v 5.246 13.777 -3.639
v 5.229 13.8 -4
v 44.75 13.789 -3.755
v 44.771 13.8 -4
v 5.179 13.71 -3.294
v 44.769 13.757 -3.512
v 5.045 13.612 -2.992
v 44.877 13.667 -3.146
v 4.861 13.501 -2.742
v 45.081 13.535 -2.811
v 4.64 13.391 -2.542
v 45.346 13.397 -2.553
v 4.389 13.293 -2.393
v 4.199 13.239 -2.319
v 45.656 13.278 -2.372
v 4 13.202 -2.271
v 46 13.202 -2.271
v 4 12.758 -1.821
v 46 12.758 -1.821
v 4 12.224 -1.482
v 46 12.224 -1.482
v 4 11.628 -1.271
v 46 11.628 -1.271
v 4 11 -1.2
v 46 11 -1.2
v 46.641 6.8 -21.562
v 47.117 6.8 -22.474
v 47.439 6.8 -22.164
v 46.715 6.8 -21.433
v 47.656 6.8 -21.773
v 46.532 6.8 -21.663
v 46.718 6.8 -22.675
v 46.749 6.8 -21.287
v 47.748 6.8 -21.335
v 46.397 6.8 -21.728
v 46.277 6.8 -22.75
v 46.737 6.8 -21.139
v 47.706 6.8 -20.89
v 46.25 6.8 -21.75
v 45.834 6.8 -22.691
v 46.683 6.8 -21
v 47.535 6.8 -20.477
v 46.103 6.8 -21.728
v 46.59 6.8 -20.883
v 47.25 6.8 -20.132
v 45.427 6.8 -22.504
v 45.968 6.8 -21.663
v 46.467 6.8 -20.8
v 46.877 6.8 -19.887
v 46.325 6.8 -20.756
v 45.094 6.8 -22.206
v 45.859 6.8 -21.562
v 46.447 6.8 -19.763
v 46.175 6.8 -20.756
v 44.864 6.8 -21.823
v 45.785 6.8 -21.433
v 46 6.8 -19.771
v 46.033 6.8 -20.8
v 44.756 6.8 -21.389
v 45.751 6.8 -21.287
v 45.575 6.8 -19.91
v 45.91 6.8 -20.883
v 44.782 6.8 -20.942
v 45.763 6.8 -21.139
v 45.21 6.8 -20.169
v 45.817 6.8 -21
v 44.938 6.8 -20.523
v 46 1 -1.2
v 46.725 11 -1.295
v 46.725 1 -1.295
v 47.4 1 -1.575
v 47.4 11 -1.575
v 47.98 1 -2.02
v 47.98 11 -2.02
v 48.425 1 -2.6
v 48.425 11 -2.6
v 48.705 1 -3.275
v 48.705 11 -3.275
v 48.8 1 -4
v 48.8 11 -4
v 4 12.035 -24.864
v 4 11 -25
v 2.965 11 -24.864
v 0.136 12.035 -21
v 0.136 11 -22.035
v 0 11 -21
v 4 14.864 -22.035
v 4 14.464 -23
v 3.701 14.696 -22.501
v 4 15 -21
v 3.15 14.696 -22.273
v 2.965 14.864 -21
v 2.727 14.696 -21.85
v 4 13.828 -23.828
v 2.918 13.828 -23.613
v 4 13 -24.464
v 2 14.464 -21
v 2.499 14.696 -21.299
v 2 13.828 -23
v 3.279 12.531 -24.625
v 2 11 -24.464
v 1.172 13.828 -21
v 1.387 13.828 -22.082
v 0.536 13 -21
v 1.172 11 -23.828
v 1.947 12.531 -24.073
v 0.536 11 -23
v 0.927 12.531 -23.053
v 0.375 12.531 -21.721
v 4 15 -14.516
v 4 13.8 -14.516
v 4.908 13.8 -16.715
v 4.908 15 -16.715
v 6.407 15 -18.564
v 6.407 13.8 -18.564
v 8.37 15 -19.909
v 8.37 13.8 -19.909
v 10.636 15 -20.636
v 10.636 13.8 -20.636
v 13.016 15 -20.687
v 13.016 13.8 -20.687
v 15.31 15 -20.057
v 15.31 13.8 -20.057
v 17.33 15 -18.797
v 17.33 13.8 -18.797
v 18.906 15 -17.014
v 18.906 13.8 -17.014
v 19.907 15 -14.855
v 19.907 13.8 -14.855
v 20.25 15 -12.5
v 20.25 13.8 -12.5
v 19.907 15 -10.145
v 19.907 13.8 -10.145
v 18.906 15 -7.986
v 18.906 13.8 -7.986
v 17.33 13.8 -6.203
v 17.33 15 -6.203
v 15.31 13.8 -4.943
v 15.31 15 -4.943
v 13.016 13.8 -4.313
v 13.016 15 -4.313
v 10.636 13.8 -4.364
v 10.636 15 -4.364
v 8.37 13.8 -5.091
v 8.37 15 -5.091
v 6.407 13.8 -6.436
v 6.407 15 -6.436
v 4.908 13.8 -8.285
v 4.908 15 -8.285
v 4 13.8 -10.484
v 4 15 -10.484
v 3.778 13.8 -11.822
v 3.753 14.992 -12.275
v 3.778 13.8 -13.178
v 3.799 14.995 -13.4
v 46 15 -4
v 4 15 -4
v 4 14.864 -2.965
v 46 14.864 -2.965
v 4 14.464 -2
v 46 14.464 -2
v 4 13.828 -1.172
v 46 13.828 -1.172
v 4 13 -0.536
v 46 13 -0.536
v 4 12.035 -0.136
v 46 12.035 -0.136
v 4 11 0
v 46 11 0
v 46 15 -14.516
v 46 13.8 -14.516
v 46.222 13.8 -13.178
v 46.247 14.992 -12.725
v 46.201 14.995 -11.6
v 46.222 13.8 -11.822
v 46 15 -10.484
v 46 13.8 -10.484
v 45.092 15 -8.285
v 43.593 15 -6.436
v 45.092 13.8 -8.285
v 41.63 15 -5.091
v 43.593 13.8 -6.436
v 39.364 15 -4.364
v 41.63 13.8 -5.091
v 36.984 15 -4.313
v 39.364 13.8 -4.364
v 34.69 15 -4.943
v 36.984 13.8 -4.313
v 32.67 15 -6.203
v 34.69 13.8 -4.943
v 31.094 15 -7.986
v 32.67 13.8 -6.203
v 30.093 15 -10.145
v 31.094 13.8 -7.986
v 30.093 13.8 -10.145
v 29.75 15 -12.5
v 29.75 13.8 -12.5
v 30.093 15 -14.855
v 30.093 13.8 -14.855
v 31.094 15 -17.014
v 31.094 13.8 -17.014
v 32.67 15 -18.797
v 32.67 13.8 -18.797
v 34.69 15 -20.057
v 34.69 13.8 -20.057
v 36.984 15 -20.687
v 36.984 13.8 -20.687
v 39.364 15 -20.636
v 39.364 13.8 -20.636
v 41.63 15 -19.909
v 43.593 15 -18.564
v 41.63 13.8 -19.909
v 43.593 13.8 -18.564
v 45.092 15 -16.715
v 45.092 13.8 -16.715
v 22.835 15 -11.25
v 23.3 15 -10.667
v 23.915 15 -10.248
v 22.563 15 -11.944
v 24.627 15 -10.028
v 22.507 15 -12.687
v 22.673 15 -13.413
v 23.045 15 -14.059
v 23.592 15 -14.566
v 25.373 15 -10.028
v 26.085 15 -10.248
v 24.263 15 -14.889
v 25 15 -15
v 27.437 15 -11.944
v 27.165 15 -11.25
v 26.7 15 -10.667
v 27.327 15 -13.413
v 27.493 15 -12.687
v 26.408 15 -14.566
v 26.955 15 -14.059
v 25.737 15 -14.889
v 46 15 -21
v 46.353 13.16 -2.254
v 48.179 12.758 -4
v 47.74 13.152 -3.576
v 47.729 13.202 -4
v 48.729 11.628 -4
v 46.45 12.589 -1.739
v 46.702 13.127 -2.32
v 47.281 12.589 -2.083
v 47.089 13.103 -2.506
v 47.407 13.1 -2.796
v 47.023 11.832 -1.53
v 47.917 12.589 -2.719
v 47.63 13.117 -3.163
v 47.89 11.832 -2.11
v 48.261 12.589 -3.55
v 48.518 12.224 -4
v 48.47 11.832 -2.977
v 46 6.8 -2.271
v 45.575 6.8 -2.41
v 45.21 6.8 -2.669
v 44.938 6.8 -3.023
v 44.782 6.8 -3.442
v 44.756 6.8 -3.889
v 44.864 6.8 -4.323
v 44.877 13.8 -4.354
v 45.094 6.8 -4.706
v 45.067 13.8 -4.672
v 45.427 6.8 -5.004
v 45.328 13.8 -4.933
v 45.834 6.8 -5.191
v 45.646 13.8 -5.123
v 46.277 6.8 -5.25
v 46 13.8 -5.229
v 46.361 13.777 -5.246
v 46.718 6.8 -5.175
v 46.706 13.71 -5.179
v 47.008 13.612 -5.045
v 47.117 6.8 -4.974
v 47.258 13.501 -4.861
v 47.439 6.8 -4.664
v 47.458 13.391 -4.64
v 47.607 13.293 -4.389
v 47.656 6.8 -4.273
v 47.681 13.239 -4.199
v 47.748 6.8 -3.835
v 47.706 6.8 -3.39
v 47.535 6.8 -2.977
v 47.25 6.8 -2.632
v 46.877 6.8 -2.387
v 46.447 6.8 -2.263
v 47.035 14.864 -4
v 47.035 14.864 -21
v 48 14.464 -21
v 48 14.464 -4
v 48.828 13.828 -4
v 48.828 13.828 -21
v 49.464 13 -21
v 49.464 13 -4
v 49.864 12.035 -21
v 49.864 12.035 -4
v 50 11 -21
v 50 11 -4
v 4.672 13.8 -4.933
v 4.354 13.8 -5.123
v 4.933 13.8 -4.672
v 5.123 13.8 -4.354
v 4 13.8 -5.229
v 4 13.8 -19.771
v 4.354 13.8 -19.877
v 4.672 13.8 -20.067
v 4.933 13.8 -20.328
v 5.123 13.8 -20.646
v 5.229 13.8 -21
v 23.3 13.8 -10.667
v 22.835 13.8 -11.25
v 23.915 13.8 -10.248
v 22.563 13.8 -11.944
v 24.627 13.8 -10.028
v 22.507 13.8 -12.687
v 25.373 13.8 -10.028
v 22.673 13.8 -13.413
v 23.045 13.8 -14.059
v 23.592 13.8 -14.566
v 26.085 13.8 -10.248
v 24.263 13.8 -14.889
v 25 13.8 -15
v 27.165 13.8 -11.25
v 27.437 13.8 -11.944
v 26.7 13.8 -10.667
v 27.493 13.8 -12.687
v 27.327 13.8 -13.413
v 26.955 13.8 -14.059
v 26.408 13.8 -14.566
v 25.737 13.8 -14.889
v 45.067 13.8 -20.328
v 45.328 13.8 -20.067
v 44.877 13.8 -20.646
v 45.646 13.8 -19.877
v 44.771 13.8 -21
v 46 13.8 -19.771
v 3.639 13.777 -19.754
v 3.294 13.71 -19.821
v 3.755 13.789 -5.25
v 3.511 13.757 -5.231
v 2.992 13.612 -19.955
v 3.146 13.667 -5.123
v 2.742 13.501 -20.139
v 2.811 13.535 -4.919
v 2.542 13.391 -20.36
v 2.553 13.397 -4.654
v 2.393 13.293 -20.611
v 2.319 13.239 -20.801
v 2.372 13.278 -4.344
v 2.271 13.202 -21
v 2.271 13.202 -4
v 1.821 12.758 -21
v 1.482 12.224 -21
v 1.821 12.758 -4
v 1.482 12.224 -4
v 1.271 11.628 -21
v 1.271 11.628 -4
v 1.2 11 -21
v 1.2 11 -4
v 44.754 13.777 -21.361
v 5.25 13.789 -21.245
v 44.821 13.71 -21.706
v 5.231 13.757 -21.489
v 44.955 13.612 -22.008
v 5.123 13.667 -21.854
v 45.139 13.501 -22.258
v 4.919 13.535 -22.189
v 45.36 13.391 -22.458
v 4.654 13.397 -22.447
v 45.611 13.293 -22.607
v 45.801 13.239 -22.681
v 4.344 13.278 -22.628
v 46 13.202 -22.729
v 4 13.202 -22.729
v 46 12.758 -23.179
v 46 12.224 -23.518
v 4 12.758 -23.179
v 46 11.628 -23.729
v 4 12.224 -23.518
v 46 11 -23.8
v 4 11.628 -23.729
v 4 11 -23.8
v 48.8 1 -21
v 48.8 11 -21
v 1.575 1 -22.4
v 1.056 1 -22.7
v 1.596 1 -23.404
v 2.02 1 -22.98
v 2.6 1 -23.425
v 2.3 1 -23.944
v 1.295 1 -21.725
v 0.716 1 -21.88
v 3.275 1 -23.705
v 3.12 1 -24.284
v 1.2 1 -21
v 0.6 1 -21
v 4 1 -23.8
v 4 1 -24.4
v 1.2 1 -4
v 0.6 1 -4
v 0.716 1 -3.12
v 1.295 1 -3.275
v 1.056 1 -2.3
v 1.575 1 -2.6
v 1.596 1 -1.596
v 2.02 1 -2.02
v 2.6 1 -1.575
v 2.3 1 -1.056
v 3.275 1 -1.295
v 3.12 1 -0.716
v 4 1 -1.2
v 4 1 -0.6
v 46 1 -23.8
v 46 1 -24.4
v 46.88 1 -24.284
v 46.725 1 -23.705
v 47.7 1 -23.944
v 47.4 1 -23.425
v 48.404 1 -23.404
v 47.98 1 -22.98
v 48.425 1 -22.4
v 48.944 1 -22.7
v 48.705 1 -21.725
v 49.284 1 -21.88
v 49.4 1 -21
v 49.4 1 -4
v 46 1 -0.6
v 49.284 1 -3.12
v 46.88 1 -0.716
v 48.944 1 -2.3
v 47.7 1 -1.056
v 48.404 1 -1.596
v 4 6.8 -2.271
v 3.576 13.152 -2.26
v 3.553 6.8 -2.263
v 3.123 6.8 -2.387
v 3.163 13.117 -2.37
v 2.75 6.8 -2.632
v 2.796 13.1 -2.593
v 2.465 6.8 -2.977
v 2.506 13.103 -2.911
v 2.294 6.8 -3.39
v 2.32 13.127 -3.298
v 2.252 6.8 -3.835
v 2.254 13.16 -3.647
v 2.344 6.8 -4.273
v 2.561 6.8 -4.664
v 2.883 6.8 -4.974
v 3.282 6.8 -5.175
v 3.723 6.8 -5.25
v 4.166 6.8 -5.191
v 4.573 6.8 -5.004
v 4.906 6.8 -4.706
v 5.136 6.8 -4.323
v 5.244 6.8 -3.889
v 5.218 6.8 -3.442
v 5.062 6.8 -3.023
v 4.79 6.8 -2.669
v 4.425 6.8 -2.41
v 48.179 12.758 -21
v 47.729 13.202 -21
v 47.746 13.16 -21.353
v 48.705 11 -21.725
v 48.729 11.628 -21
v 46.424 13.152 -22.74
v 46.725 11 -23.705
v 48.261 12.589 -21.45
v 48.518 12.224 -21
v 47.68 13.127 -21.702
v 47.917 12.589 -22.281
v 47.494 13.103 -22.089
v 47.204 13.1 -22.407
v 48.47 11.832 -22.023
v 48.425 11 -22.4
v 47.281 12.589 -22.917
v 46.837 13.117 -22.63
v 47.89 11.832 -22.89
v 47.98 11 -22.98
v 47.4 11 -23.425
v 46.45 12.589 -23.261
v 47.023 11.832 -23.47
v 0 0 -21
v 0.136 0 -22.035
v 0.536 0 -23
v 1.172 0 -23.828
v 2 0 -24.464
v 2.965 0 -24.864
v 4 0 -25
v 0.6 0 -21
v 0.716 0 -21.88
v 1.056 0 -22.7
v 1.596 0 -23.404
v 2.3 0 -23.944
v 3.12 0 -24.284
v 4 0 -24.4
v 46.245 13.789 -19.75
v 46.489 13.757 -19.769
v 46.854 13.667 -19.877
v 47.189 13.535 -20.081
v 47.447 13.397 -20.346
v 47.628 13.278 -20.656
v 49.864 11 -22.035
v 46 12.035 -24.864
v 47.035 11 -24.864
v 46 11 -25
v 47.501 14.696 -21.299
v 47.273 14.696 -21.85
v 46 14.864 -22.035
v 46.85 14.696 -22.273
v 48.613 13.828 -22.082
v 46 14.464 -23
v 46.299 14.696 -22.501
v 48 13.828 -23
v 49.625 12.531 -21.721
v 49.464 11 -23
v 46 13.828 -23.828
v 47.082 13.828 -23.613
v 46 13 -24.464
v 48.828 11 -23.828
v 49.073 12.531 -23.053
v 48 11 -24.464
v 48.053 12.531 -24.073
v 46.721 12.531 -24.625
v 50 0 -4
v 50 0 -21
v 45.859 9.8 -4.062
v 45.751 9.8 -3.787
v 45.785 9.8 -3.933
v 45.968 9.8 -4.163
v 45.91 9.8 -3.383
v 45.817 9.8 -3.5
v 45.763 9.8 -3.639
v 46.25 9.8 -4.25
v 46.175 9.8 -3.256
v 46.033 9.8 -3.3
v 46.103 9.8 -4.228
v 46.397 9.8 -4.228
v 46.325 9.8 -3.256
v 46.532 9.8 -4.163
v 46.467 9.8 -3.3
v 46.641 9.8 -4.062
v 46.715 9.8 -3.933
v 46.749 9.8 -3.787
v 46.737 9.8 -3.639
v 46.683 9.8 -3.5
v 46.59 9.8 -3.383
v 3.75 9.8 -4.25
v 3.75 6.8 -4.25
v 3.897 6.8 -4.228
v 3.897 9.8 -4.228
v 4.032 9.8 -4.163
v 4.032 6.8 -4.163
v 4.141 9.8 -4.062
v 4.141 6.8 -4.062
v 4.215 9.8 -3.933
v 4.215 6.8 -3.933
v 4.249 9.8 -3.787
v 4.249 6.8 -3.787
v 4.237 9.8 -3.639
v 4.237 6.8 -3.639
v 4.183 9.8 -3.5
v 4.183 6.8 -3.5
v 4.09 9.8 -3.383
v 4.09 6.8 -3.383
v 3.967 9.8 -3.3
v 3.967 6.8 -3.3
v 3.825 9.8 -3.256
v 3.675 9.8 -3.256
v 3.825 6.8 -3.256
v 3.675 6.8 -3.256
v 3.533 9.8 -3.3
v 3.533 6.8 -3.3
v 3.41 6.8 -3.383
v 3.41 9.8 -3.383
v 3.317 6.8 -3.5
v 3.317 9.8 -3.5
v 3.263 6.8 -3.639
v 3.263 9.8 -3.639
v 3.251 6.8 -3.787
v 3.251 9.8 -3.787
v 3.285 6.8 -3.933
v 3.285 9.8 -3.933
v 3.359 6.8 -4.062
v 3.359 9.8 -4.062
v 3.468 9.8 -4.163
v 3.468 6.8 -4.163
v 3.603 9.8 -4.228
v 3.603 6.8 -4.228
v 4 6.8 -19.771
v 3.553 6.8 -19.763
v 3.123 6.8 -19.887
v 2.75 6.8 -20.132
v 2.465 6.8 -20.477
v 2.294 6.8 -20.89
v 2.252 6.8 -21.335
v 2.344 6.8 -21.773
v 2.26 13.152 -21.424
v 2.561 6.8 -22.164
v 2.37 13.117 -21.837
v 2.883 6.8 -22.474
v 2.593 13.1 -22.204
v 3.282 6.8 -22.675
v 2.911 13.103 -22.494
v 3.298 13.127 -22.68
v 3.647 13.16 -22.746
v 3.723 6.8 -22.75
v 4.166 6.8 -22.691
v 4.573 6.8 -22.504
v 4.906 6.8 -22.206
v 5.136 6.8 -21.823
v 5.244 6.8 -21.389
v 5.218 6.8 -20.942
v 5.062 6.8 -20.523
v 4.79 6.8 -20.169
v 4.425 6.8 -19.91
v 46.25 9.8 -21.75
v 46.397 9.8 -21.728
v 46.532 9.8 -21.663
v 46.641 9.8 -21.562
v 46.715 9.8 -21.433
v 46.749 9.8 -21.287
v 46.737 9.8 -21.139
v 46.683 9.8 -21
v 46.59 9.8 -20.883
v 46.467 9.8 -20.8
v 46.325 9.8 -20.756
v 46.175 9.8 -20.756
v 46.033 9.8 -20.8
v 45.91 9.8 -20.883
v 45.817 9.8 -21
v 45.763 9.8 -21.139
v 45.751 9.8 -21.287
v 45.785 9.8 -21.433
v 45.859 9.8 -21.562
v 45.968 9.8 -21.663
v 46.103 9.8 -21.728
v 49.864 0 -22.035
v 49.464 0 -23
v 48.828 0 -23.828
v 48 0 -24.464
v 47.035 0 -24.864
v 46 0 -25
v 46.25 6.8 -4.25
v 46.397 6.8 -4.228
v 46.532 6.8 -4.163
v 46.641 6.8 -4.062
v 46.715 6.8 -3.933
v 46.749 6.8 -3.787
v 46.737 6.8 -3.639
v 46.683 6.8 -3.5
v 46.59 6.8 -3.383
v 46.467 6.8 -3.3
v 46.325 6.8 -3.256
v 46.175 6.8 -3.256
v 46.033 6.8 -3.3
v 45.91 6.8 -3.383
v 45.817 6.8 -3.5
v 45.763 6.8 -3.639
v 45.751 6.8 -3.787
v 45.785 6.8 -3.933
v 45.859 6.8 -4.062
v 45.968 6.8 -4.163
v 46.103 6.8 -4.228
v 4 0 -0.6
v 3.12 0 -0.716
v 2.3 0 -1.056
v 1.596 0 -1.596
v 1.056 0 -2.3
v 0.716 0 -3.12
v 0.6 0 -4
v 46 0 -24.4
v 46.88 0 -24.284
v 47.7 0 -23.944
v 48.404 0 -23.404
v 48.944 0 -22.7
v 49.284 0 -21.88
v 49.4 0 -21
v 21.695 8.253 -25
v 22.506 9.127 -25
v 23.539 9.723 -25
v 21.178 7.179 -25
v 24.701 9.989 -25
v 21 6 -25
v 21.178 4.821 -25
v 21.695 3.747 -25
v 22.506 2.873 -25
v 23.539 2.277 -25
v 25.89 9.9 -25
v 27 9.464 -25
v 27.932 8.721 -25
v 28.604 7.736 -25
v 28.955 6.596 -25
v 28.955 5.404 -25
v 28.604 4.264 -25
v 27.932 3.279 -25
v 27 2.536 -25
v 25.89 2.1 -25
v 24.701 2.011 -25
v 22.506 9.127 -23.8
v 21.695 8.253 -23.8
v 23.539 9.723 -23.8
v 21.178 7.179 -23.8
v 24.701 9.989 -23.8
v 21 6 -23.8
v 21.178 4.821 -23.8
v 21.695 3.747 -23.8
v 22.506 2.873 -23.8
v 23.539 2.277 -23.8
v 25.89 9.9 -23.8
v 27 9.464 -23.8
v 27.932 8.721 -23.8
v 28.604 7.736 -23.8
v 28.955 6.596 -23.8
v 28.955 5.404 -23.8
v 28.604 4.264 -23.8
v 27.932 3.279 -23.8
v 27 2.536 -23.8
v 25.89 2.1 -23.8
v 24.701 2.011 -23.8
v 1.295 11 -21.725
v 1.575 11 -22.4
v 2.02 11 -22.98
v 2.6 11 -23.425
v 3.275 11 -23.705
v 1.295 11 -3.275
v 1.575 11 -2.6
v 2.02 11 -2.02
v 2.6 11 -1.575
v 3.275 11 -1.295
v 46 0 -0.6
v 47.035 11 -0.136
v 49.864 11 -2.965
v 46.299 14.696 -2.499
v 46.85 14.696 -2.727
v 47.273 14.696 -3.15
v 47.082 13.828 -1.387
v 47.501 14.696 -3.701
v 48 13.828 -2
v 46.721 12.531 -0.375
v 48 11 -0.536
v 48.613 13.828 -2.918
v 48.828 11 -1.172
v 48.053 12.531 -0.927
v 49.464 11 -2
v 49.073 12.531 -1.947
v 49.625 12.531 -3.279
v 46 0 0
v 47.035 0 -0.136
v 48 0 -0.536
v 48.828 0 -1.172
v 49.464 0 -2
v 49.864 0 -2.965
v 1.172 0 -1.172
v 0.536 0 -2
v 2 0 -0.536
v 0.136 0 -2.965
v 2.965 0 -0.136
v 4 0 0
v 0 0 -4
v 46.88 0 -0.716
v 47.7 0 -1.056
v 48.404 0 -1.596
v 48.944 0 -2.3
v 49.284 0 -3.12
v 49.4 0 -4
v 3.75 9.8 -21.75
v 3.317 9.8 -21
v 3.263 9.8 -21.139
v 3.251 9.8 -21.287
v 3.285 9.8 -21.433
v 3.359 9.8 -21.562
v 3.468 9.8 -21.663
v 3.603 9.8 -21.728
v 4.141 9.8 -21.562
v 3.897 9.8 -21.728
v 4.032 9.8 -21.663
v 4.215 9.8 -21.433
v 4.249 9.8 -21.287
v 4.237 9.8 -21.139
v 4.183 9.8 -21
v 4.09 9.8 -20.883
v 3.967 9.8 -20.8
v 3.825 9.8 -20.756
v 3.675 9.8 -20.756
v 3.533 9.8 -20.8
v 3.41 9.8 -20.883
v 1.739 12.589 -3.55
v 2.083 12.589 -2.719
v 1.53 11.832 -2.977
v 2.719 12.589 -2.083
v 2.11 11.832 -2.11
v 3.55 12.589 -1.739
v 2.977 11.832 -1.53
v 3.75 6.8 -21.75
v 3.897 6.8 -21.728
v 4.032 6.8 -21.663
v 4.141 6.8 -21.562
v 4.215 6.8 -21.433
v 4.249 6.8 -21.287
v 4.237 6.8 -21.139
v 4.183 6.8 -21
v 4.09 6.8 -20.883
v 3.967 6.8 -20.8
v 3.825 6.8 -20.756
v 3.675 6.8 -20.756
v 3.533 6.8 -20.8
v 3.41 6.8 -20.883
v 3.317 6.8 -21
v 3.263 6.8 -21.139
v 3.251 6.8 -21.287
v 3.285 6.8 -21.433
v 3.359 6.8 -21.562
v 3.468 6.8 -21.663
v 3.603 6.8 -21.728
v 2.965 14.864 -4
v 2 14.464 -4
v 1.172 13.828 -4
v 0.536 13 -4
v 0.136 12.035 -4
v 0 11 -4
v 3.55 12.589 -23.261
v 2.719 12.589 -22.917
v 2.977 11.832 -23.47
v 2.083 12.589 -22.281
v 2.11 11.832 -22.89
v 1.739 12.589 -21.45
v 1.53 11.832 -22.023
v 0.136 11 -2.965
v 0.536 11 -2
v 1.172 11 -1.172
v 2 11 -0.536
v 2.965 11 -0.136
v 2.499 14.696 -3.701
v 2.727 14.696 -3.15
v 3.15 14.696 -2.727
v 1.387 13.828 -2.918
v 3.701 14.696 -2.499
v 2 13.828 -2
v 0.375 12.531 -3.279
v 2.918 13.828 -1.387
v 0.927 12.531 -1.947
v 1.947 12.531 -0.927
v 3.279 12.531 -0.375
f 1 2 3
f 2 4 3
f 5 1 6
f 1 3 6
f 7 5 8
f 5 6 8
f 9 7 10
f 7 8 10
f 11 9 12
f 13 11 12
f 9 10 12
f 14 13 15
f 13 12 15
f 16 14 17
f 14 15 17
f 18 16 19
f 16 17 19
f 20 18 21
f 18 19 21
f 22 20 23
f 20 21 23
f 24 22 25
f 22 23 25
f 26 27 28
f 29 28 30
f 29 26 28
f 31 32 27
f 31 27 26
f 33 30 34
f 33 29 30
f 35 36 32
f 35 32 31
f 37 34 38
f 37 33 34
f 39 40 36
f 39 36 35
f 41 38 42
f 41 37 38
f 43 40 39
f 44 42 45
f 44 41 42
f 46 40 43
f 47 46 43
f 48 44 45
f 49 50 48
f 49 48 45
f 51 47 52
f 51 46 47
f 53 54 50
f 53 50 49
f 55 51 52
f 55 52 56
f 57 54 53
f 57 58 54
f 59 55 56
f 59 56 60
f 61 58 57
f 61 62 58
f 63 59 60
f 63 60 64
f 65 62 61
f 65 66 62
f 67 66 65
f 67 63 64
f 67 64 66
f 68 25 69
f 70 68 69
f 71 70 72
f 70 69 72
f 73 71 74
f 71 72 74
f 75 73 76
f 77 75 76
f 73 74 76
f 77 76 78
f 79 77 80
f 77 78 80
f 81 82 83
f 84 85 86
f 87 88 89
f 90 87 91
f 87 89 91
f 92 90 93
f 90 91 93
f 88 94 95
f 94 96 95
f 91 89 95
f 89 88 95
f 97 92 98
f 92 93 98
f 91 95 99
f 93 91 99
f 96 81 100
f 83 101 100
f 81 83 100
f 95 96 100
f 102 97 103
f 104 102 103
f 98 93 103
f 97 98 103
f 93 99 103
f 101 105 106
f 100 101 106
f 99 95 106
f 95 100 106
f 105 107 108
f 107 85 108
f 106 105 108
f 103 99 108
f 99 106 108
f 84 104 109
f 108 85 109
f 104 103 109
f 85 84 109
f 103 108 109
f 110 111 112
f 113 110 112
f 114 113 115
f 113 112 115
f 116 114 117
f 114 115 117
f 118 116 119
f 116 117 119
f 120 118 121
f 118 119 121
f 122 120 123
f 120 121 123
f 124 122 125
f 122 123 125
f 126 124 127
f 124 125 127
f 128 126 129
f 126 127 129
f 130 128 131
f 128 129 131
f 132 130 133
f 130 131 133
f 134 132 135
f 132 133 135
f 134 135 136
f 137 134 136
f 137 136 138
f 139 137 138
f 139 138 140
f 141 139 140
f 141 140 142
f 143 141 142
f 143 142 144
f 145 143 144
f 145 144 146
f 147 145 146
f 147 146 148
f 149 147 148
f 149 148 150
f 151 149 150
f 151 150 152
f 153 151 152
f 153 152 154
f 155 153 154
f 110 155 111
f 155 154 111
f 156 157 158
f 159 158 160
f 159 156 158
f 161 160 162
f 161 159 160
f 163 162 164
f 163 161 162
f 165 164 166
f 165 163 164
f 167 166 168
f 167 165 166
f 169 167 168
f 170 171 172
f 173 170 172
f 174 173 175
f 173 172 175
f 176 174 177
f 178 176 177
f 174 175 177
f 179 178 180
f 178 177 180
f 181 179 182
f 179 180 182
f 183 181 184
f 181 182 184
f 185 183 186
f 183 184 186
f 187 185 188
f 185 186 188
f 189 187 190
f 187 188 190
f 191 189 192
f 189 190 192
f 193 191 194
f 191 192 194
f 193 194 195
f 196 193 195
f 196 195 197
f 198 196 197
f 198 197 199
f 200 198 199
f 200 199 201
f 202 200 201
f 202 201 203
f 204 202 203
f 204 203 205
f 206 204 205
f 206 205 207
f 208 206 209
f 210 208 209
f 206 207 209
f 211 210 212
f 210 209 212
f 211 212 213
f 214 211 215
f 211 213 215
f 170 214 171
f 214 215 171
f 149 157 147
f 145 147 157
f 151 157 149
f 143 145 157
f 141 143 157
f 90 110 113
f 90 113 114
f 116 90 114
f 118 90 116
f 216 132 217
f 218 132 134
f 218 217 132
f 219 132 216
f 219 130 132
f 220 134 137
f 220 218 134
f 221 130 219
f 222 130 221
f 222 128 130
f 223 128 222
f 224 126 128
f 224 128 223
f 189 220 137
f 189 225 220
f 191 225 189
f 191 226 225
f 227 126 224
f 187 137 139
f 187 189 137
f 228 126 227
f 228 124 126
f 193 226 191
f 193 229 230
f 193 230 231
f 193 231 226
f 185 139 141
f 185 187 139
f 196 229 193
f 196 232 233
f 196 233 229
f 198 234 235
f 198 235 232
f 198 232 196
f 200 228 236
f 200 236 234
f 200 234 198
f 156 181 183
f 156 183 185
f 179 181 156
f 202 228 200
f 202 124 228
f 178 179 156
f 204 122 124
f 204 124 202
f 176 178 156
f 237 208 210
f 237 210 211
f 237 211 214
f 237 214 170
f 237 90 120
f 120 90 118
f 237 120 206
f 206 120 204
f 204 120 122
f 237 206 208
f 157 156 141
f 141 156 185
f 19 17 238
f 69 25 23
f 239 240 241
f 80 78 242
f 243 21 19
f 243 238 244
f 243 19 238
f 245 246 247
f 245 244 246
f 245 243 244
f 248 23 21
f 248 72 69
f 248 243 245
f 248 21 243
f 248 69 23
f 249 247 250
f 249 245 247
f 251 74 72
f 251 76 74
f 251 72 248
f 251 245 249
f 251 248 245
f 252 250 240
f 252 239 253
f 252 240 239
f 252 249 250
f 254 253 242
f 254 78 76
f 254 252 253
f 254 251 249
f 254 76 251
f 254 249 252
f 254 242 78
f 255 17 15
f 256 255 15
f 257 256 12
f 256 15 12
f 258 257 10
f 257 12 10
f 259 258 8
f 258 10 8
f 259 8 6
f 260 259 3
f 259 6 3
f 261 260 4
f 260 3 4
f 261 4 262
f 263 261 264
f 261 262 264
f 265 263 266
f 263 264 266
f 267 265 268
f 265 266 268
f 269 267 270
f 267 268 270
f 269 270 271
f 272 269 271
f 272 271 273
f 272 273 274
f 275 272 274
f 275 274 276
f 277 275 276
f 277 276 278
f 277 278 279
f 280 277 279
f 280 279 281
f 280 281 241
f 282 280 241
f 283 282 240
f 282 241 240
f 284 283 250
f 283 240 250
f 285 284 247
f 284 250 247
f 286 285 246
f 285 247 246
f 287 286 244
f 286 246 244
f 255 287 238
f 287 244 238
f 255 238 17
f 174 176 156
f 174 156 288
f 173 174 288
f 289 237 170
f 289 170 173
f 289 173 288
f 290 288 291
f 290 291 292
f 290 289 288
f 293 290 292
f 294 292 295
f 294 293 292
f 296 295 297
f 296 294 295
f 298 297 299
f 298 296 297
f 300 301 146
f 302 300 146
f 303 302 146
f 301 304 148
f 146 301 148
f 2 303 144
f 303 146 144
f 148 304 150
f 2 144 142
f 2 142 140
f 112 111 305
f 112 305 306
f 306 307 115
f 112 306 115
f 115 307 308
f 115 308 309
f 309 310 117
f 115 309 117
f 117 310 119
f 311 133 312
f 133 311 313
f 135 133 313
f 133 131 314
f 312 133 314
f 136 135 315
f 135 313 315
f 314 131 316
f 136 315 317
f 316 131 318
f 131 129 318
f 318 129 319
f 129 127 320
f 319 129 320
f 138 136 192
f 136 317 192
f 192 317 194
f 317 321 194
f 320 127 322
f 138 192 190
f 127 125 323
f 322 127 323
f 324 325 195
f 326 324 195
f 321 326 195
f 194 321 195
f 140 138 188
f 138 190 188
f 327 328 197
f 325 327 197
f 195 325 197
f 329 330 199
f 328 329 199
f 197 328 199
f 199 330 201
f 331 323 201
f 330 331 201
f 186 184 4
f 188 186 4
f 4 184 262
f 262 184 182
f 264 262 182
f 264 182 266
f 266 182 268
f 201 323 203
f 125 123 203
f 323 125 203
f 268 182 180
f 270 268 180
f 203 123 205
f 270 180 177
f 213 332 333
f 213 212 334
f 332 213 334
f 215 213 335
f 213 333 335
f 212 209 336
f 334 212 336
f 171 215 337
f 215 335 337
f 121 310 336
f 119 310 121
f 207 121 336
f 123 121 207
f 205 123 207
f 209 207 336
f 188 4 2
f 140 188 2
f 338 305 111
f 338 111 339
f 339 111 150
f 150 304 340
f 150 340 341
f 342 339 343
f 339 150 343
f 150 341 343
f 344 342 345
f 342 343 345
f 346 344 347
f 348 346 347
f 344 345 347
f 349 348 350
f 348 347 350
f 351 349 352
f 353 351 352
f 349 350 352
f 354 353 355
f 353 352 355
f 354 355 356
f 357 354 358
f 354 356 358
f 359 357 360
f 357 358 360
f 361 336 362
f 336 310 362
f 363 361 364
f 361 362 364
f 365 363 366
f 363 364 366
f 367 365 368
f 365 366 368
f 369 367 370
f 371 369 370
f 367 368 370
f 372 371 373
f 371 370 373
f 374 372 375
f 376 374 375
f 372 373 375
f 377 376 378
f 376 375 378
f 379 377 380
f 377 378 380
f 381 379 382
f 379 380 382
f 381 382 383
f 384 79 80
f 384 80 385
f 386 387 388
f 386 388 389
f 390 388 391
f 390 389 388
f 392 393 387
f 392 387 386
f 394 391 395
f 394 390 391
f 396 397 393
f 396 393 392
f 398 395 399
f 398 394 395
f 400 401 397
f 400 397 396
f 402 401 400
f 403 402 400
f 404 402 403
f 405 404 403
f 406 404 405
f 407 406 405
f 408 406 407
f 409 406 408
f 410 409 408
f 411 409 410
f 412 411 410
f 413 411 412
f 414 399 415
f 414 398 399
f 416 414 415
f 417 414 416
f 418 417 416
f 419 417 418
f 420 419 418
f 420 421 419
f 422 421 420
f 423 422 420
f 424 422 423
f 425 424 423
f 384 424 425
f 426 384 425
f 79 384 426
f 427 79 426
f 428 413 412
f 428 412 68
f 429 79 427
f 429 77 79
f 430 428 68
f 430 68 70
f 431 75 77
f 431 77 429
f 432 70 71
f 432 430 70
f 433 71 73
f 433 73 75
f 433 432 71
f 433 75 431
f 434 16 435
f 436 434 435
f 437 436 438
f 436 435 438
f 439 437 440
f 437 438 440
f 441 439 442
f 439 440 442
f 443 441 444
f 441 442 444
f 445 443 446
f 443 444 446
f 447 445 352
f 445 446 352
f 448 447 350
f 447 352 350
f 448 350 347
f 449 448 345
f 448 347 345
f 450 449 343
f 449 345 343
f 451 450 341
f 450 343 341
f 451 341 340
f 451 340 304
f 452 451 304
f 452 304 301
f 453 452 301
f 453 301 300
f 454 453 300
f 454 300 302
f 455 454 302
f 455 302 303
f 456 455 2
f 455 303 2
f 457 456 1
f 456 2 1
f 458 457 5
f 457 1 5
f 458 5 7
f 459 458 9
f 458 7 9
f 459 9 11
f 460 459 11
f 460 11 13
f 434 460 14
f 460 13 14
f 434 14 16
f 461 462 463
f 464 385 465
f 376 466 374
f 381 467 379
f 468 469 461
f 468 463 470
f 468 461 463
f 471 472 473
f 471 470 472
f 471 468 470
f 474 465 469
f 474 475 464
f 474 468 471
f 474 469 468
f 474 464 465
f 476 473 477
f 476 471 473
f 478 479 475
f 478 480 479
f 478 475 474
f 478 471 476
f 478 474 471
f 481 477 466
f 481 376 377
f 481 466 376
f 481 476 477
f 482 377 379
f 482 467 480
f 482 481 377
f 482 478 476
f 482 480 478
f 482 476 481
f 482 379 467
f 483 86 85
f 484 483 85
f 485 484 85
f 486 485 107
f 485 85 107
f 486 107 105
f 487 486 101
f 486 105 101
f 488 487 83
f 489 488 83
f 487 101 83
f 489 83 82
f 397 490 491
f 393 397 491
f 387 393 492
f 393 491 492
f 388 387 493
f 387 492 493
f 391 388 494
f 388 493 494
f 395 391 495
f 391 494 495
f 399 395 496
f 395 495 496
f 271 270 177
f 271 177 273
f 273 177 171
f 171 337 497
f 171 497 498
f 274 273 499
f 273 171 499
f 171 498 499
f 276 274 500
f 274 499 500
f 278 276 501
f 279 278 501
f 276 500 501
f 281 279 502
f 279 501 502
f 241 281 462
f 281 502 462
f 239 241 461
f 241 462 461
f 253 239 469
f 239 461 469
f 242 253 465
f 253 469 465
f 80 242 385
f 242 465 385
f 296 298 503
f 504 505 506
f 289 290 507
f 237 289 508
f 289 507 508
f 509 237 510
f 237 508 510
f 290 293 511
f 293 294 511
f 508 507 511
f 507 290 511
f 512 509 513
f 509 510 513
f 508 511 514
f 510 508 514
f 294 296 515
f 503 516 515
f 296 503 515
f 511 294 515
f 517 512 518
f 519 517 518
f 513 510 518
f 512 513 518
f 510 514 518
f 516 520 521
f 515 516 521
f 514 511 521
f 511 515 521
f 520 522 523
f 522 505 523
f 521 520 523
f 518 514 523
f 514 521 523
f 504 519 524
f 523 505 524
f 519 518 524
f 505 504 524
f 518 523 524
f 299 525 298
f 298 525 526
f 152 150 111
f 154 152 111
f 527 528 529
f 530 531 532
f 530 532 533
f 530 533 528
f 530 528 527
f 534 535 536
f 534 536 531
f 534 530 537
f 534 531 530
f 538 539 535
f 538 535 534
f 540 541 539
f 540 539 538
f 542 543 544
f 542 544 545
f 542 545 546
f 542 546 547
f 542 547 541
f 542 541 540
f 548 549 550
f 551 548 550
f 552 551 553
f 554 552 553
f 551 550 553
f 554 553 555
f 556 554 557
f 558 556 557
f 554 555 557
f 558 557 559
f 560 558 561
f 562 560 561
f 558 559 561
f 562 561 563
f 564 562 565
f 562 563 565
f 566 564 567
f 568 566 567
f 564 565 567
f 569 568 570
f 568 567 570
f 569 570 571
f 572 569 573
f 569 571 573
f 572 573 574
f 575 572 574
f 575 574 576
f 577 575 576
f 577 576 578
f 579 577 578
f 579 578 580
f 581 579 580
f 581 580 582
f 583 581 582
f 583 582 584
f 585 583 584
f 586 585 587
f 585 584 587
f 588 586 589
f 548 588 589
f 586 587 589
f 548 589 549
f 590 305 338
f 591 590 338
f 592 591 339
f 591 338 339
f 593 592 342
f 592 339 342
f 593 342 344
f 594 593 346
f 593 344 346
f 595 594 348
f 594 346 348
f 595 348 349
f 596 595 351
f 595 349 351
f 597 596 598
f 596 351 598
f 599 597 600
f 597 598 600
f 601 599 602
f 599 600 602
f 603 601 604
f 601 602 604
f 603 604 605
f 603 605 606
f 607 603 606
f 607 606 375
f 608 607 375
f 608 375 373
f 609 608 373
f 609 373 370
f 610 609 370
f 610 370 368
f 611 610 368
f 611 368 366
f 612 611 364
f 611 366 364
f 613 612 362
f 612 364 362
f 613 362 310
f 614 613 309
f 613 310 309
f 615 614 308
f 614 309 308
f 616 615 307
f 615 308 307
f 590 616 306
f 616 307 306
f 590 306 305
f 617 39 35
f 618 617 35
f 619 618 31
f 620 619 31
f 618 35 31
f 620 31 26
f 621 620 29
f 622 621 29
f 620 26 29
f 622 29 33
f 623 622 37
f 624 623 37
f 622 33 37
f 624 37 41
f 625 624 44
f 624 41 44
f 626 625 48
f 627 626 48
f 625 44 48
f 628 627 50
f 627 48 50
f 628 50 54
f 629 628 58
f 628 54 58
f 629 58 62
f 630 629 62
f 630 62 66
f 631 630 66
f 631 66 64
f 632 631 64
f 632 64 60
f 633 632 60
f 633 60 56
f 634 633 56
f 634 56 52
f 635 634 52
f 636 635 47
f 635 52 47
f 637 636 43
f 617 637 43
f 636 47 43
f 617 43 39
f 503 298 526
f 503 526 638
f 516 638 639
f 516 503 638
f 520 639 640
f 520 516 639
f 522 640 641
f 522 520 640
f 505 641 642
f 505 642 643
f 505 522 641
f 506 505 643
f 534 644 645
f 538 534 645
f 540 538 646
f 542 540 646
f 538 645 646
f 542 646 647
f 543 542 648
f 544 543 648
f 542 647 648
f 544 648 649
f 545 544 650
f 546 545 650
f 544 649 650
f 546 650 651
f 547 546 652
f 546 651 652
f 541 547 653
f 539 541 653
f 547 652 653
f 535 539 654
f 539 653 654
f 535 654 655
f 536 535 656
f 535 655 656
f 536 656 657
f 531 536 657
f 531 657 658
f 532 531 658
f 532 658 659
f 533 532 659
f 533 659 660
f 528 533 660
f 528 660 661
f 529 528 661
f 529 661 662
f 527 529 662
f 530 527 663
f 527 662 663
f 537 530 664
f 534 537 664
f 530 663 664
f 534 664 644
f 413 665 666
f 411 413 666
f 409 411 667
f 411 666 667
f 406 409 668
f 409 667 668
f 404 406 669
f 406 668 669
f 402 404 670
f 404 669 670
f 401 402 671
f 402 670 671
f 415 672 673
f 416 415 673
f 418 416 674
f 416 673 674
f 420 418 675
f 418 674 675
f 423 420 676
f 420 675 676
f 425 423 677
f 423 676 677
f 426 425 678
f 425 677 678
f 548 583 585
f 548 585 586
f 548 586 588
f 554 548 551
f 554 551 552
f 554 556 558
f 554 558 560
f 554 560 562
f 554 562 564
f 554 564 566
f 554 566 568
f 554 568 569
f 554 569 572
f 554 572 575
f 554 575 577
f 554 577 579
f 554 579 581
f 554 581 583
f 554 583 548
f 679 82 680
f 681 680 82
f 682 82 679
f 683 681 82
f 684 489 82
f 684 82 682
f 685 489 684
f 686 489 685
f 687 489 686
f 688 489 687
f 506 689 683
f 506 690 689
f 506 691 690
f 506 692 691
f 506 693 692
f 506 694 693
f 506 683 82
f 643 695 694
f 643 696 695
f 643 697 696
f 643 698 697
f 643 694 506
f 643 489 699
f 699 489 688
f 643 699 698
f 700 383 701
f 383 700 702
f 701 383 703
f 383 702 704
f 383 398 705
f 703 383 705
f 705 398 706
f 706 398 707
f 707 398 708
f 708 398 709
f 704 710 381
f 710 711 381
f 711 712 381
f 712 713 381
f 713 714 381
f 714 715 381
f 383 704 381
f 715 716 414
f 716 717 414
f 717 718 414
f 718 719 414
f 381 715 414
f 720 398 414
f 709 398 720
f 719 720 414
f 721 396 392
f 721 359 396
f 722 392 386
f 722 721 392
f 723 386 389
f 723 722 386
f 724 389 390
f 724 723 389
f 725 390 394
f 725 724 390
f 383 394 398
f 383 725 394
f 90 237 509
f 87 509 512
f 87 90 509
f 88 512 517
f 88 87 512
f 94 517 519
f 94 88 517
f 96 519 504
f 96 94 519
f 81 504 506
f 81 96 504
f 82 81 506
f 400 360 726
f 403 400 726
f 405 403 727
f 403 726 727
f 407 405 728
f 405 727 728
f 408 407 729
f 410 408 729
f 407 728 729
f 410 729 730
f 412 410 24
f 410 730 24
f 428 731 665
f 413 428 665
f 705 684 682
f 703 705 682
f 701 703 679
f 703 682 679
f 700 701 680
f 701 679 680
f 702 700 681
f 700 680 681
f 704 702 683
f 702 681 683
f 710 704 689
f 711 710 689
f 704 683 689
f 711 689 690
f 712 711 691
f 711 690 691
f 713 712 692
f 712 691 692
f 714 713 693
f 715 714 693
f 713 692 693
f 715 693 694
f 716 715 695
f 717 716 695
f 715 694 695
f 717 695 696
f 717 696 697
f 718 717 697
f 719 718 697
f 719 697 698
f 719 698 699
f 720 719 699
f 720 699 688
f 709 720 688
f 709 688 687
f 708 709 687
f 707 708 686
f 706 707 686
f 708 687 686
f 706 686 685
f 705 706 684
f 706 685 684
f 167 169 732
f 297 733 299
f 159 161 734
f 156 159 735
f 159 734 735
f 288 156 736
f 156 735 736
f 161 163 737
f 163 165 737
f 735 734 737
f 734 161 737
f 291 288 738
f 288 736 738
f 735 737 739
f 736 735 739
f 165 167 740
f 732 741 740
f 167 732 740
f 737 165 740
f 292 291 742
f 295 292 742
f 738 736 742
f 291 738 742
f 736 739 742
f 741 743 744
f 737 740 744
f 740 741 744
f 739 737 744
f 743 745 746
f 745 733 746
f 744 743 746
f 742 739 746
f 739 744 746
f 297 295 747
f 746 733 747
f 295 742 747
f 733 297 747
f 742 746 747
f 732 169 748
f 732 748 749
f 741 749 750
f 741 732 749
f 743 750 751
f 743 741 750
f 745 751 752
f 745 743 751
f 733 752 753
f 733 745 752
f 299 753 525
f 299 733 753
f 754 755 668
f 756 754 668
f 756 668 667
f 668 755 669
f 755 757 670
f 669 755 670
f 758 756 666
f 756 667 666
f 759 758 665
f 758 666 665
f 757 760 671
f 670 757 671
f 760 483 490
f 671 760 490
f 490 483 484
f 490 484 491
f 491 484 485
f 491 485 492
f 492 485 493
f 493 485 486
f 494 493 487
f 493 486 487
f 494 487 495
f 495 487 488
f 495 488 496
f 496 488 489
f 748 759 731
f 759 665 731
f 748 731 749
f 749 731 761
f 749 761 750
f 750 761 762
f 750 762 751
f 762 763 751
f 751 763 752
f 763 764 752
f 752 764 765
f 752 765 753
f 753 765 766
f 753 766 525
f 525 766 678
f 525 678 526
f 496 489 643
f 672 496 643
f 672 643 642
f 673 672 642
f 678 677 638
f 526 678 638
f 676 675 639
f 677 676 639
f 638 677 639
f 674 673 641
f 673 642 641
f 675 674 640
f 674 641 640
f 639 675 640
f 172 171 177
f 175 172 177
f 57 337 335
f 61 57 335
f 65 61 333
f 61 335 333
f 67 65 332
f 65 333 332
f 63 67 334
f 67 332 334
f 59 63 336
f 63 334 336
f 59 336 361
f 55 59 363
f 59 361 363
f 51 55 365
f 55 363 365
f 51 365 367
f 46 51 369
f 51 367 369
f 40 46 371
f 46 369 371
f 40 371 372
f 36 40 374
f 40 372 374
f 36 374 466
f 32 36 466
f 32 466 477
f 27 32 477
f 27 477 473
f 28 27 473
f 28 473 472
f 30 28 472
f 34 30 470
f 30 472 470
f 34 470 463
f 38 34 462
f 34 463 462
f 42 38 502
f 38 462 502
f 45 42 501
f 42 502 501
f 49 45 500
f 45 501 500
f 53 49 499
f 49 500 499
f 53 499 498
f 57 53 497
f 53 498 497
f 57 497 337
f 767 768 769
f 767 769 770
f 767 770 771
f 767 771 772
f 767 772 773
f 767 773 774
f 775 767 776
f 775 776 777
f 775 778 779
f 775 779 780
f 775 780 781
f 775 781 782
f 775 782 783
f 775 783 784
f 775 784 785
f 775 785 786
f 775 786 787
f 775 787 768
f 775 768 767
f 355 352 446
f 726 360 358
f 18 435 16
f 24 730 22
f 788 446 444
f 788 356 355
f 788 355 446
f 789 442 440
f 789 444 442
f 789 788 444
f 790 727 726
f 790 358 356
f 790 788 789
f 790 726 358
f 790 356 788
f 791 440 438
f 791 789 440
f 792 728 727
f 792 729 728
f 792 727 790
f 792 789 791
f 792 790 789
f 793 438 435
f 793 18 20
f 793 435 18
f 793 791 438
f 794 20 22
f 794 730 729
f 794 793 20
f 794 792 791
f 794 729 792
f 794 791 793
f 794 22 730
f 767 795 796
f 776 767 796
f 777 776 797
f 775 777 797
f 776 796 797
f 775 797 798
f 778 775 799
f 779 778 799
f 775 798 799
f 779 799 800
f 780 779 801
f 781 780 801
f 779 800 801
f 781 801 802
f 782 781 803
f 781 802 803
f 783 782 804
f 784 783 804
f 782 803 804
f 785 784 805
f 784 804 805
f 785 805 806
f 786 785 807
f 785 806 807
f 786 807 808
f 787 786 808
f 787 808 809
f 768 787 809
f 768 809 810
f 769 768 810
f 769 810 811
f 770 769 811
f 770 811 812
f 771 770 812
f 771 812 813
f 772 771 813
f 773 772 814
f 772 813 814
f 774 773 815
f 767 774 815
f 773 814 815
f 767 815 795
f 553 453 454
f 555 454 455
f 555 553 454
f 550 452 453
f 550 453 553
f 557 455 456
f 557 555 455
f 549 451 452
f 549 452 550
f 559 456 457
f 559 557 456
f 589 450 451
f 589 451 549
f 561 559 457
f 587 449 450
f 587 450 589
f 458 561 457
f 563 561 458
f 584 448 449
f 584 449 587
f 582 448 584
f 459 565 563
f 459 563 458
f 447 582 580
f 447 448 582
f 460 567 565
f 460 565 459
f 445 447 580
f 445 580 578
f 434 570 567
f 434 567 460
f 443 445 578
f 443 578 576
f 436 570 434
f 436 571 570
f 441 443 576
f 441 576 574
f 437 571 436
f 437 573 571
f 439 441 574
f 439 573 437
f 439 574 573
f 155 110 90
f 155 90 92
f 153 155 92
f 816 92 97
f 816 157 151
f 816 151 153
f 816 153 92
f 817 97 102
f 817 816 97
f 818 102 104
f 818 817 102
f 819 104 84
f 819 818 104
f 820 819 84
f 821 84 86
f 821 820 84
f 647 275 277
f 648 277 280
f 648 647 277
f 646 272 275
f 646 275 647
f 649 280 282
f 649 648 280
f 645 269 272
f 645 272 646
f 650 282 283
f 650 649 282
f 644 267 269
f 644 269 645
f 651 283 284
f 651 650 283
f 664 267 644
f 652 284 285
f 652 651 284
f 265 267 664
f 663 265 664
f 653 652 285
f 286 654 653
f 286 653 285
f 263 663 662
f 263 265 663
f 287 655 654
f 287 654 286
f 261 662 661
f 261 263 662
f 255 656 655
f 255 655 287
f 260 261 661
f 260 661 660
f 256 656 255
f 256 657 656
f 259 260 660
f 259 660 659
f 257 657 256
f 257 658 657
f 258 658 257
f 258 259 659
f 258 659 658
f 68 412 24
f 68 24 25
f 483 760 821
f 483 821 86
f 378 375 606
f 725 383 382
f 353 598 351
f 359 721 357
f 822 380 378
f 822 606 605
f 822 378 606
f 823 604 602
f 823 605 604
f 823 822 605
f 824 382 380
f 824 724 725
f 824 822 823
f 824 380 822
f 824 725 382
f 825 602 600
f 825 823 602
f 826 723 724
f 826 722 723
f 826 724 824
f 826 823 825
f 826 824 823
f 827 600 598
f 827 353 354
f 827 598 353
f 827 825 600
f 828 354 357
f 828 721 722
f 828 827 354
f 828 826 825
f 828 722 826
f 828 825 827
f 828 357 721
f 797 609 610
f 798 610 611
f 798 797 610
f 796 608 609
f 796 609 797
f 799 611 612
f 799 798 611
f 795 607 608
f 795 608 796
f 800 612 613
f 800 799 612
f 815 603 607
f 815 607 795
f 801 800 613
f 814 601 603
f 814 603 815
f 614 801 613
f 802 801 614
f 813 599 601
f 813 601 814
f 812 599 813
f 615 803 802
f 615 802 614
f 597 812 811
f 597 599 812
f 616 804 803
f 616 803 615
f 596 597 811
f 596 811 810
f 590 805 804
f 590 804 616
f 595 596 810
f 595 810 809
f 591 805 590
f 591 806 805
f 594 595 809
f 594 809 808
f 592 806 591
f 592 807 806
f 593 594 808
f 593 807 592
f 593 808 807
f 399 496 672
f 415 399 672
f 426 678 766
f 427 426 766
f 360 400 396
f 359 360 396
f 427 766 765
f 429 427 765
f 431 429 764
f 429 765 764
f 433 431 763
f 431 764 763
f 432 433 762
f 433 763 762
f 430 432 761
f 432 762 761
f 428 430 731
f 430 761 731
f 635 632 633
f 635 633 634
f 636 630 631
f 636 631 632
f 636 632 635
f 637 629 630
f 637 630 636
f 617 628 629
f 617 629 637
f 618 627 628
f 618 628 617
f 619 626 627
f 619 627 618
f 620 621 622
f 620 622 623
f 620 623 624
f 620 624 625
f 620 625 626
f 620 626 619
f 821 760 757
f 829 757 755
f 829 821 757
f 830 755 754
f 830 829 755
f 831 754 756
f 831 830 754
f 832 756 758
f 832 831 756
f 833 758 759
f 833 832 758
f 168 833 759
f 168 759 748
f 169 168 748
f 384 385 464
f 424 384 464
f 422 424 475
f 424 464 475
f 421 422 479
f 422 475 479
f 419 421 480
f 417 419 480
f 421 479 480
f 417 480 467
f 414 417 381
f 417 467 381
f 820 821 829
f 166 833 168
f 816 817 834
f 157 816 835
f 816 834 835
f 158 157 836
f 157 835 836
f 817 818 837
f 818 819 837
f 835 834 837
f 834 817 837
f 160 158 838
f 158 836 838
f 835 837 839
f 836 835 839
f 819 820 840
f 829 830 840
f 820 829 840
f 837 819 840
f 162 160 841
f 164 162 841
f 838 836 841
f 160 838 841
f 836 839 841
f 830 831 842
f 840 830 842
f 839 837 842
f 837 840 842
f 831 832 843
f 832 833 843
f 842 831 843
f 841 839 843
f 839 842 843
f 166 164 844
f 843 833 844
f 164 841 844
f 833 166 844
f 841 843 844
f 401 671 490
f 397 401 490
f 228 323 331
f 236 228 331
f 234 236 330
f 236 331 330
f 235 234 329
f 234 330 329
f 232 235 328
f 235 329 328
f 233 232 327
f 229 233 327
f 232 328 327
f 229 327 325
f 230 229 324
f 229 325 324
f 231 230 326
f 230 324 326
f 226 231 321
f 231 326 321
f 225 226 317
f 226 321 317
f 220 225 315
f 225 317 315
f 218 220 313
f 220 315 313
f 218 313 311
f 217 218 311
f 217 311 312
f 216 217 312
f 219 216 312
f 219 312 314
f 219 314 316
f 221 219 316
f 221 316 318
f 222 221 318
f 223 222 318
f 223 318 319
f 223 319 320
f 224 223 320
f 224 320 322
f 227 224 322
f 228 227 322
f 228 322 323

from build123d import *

# Parameters (mm, degrees)
SKETCH1_W           = 50
SKETCH1_H           = 25
BOSS_EXTRUDE2_DEPTH = 15
FILLET1_R           = 4
FILLET2_R           = 4
SHELL1_T            = -1.2
SKETCH2_R           = 8.25
CUT_EXTRUDE1_DEPTH  = 58.579857589
SKETCH3_R           = 1.5
BOSS_EXTRUDE3_DEPTH = 7
SKETCH6_R           = 0.5
CUT_EXTRUDE3_DEPTH  = 3
CUT_EXTRUDE6_DEPTH  = 1
SKETCH9_R           = 4
CUT_EXTRUDE15_DEPTH = 1.2
SKETCH13_R          = 2.5
CUT_EXTRUDE16_DEPTH = 58.579857676


with BuildPart() as part:
    # Sketch1 → Boss-Extrude2 (new body)
    with BuildSketch(Plane(origin=(0, 0, 0), x_dir=(1, 0, 0), z_dir=(0, 1, 0))):
        with Locations((25, 12.5)):
            Rectangle(SKETCH1_W, SKETCH1_H)
    extrude(amount=BOSS_EXTRUDE2_DEPTH)

    # Fillet1
    fillet1_edges = [part.edges().sort_by_distance(p)[0] for p in [
        (0, 7.5, -25),
        (50, 7.5, -25),
        (50, 7.5, 0),
        (0, 7.5, 0),
    ]]
    fillet(fillet1_edges, radius=FILLET1_R)

    # Fillet2
    fillet2_edges = [part.edges().sort_by_distance(p)[0] for p in [
        (50, 15, -12.5),
        (25, 15, 0),
        (0, 15, -12.5),
        (25, 15, -25),
        (48.828427125, 15, -23.828427125),
        (1.171572875, 15, -23.828427125),
        (1.171572875, 15, -1.171572875),
        (48.828427125, 15, -1.171572875),
    ]]
    fillet(fillet2_edges, radius=FILLET2_R)

    # Shell1
    shell1_openings = [part.faces().sort_by_distance(p)[0] for p in [
        (25, 0, -12.5),
    ]]
    offset(amount=SHELL1_T, openings=shell1_openings, kind=Kind.INTERSECTION)

    # Sketch2 → Cut-Extrude1 (cut, through all)
    with BuildSketch(Plane.XZ.offset(-13.8)):
        with Locations(Location((38, -12.5, 0), (0, 0, 345.858889766))):
            Circle(SKETCH2_R)
        with Locations(Location((12, -12.5, 0), (0, 0, 194.141110234))):
            Circle(SKETCH2_R)
    extrude(amount=-CUT_EXTRUDE1_DEPTH, mode=Mode.SUBTRACT)

    # Sketch3 → Boss-Extrude3 (add)
    with BuildSketch(Plane.XZ.offset(-13.8)):
        with Locations(Location((46.25, -21.25, 0), (0, 0, 99.594068224))):
            Circle(SKETCH3_R)
        with Locations(Location((3.75, -21.25, 0), (0, 0, 80.405931773))):
            Circle(SKETCH3_R)
        with Locations(Location((3.75, -3.75, 0), (0, 0, 80.405943008))):
            Circle(SKETCH3_R)
        with Locations(Location((46.25, -3.75, 0), (0, 0, 99.594068235))):
            Circle(SKETCH3_R)
    extrude(amount=BOSS_EXTRUDE3_DEPTH)

    # Sketch6 → Cut-Extrude3 (cut)
    with BuildSketch(Plane.XZ.offset(-6.8)):
        with Locations(Location((46.25, -3.75, 0), (0, 0, 270))):
            Circle(SKETCH6_R)
        with Locations(Location((46.25, -21.25, 0), (0, 0, 270))):
            Circle(SKETCH6_R)
        with Locations(Location((3.75, -21.25, 0), (0, 0, 270))):
            Circle(SKETCH6_R)
        with Locations(Location((3.75, -3.75, 0), (0, 0, 270))):
            Circle(SKETCH6_R)
    extrude(amount=-CUT_EXTRUDE3_DEPTH, mode=Mode.SUBTRACT)

    # Sketch8 → Cut-Extrude6 (cut)
    with BuildSketch(Plane.XZ):
        with BuildLine():
            Line((0.6, -4), (0.6, -21))
            ThreePointArc((0.6, -21), (1.595836944, -23.404163056), (4, -24.4))
            Line((4, -24.4), (46, -24.4))
            ThreePointArc((46, -24.4), (48.404163056, -23.404163056), (49.4, -21))
            Line((49.4, -21), (49.4, -4))
            ThreePointArc((49.4, -4), (48.404163056, -1.595836944), (46, -0.6))
            Line((46, -0.6), (4, -0.6))
            ThreePointArc((4, -0.6), (1.595836944, -1.595836944), (0.6, -4))
        make_face()
    extrude(amount=-CUT_EXTRUDE6_DEPTH, mode=Mode.SUBTRACT)

    # Sketch9 → Cut-Extrude15 (cut)
    with BuildSketch(Plane(origin=(0, 0, -25), x_dir=(-1, 0, 0), z_dir=(0, 0, -1))):
        with Locations((-25, 6)):
            Circle(SKETCH9_R)
    extrude(amount=-CUT_EXTRUDE15_DEPTH, mode=Mode.SUBTRACT)

    # Sketch13 → Cut-Extrude16 (cut, through all)
    with BuildSketch(Plane.XZ.offset(-13.8)):
        with Locations(Location((25, -12.5, 0), (0, 0, 270))):
            Circle(SKETCH13_R)
    extrude(amount=-CUT_EXTRUDE16_DEPTH, mode=Mode.SUBTRACT)


solid = part.part
